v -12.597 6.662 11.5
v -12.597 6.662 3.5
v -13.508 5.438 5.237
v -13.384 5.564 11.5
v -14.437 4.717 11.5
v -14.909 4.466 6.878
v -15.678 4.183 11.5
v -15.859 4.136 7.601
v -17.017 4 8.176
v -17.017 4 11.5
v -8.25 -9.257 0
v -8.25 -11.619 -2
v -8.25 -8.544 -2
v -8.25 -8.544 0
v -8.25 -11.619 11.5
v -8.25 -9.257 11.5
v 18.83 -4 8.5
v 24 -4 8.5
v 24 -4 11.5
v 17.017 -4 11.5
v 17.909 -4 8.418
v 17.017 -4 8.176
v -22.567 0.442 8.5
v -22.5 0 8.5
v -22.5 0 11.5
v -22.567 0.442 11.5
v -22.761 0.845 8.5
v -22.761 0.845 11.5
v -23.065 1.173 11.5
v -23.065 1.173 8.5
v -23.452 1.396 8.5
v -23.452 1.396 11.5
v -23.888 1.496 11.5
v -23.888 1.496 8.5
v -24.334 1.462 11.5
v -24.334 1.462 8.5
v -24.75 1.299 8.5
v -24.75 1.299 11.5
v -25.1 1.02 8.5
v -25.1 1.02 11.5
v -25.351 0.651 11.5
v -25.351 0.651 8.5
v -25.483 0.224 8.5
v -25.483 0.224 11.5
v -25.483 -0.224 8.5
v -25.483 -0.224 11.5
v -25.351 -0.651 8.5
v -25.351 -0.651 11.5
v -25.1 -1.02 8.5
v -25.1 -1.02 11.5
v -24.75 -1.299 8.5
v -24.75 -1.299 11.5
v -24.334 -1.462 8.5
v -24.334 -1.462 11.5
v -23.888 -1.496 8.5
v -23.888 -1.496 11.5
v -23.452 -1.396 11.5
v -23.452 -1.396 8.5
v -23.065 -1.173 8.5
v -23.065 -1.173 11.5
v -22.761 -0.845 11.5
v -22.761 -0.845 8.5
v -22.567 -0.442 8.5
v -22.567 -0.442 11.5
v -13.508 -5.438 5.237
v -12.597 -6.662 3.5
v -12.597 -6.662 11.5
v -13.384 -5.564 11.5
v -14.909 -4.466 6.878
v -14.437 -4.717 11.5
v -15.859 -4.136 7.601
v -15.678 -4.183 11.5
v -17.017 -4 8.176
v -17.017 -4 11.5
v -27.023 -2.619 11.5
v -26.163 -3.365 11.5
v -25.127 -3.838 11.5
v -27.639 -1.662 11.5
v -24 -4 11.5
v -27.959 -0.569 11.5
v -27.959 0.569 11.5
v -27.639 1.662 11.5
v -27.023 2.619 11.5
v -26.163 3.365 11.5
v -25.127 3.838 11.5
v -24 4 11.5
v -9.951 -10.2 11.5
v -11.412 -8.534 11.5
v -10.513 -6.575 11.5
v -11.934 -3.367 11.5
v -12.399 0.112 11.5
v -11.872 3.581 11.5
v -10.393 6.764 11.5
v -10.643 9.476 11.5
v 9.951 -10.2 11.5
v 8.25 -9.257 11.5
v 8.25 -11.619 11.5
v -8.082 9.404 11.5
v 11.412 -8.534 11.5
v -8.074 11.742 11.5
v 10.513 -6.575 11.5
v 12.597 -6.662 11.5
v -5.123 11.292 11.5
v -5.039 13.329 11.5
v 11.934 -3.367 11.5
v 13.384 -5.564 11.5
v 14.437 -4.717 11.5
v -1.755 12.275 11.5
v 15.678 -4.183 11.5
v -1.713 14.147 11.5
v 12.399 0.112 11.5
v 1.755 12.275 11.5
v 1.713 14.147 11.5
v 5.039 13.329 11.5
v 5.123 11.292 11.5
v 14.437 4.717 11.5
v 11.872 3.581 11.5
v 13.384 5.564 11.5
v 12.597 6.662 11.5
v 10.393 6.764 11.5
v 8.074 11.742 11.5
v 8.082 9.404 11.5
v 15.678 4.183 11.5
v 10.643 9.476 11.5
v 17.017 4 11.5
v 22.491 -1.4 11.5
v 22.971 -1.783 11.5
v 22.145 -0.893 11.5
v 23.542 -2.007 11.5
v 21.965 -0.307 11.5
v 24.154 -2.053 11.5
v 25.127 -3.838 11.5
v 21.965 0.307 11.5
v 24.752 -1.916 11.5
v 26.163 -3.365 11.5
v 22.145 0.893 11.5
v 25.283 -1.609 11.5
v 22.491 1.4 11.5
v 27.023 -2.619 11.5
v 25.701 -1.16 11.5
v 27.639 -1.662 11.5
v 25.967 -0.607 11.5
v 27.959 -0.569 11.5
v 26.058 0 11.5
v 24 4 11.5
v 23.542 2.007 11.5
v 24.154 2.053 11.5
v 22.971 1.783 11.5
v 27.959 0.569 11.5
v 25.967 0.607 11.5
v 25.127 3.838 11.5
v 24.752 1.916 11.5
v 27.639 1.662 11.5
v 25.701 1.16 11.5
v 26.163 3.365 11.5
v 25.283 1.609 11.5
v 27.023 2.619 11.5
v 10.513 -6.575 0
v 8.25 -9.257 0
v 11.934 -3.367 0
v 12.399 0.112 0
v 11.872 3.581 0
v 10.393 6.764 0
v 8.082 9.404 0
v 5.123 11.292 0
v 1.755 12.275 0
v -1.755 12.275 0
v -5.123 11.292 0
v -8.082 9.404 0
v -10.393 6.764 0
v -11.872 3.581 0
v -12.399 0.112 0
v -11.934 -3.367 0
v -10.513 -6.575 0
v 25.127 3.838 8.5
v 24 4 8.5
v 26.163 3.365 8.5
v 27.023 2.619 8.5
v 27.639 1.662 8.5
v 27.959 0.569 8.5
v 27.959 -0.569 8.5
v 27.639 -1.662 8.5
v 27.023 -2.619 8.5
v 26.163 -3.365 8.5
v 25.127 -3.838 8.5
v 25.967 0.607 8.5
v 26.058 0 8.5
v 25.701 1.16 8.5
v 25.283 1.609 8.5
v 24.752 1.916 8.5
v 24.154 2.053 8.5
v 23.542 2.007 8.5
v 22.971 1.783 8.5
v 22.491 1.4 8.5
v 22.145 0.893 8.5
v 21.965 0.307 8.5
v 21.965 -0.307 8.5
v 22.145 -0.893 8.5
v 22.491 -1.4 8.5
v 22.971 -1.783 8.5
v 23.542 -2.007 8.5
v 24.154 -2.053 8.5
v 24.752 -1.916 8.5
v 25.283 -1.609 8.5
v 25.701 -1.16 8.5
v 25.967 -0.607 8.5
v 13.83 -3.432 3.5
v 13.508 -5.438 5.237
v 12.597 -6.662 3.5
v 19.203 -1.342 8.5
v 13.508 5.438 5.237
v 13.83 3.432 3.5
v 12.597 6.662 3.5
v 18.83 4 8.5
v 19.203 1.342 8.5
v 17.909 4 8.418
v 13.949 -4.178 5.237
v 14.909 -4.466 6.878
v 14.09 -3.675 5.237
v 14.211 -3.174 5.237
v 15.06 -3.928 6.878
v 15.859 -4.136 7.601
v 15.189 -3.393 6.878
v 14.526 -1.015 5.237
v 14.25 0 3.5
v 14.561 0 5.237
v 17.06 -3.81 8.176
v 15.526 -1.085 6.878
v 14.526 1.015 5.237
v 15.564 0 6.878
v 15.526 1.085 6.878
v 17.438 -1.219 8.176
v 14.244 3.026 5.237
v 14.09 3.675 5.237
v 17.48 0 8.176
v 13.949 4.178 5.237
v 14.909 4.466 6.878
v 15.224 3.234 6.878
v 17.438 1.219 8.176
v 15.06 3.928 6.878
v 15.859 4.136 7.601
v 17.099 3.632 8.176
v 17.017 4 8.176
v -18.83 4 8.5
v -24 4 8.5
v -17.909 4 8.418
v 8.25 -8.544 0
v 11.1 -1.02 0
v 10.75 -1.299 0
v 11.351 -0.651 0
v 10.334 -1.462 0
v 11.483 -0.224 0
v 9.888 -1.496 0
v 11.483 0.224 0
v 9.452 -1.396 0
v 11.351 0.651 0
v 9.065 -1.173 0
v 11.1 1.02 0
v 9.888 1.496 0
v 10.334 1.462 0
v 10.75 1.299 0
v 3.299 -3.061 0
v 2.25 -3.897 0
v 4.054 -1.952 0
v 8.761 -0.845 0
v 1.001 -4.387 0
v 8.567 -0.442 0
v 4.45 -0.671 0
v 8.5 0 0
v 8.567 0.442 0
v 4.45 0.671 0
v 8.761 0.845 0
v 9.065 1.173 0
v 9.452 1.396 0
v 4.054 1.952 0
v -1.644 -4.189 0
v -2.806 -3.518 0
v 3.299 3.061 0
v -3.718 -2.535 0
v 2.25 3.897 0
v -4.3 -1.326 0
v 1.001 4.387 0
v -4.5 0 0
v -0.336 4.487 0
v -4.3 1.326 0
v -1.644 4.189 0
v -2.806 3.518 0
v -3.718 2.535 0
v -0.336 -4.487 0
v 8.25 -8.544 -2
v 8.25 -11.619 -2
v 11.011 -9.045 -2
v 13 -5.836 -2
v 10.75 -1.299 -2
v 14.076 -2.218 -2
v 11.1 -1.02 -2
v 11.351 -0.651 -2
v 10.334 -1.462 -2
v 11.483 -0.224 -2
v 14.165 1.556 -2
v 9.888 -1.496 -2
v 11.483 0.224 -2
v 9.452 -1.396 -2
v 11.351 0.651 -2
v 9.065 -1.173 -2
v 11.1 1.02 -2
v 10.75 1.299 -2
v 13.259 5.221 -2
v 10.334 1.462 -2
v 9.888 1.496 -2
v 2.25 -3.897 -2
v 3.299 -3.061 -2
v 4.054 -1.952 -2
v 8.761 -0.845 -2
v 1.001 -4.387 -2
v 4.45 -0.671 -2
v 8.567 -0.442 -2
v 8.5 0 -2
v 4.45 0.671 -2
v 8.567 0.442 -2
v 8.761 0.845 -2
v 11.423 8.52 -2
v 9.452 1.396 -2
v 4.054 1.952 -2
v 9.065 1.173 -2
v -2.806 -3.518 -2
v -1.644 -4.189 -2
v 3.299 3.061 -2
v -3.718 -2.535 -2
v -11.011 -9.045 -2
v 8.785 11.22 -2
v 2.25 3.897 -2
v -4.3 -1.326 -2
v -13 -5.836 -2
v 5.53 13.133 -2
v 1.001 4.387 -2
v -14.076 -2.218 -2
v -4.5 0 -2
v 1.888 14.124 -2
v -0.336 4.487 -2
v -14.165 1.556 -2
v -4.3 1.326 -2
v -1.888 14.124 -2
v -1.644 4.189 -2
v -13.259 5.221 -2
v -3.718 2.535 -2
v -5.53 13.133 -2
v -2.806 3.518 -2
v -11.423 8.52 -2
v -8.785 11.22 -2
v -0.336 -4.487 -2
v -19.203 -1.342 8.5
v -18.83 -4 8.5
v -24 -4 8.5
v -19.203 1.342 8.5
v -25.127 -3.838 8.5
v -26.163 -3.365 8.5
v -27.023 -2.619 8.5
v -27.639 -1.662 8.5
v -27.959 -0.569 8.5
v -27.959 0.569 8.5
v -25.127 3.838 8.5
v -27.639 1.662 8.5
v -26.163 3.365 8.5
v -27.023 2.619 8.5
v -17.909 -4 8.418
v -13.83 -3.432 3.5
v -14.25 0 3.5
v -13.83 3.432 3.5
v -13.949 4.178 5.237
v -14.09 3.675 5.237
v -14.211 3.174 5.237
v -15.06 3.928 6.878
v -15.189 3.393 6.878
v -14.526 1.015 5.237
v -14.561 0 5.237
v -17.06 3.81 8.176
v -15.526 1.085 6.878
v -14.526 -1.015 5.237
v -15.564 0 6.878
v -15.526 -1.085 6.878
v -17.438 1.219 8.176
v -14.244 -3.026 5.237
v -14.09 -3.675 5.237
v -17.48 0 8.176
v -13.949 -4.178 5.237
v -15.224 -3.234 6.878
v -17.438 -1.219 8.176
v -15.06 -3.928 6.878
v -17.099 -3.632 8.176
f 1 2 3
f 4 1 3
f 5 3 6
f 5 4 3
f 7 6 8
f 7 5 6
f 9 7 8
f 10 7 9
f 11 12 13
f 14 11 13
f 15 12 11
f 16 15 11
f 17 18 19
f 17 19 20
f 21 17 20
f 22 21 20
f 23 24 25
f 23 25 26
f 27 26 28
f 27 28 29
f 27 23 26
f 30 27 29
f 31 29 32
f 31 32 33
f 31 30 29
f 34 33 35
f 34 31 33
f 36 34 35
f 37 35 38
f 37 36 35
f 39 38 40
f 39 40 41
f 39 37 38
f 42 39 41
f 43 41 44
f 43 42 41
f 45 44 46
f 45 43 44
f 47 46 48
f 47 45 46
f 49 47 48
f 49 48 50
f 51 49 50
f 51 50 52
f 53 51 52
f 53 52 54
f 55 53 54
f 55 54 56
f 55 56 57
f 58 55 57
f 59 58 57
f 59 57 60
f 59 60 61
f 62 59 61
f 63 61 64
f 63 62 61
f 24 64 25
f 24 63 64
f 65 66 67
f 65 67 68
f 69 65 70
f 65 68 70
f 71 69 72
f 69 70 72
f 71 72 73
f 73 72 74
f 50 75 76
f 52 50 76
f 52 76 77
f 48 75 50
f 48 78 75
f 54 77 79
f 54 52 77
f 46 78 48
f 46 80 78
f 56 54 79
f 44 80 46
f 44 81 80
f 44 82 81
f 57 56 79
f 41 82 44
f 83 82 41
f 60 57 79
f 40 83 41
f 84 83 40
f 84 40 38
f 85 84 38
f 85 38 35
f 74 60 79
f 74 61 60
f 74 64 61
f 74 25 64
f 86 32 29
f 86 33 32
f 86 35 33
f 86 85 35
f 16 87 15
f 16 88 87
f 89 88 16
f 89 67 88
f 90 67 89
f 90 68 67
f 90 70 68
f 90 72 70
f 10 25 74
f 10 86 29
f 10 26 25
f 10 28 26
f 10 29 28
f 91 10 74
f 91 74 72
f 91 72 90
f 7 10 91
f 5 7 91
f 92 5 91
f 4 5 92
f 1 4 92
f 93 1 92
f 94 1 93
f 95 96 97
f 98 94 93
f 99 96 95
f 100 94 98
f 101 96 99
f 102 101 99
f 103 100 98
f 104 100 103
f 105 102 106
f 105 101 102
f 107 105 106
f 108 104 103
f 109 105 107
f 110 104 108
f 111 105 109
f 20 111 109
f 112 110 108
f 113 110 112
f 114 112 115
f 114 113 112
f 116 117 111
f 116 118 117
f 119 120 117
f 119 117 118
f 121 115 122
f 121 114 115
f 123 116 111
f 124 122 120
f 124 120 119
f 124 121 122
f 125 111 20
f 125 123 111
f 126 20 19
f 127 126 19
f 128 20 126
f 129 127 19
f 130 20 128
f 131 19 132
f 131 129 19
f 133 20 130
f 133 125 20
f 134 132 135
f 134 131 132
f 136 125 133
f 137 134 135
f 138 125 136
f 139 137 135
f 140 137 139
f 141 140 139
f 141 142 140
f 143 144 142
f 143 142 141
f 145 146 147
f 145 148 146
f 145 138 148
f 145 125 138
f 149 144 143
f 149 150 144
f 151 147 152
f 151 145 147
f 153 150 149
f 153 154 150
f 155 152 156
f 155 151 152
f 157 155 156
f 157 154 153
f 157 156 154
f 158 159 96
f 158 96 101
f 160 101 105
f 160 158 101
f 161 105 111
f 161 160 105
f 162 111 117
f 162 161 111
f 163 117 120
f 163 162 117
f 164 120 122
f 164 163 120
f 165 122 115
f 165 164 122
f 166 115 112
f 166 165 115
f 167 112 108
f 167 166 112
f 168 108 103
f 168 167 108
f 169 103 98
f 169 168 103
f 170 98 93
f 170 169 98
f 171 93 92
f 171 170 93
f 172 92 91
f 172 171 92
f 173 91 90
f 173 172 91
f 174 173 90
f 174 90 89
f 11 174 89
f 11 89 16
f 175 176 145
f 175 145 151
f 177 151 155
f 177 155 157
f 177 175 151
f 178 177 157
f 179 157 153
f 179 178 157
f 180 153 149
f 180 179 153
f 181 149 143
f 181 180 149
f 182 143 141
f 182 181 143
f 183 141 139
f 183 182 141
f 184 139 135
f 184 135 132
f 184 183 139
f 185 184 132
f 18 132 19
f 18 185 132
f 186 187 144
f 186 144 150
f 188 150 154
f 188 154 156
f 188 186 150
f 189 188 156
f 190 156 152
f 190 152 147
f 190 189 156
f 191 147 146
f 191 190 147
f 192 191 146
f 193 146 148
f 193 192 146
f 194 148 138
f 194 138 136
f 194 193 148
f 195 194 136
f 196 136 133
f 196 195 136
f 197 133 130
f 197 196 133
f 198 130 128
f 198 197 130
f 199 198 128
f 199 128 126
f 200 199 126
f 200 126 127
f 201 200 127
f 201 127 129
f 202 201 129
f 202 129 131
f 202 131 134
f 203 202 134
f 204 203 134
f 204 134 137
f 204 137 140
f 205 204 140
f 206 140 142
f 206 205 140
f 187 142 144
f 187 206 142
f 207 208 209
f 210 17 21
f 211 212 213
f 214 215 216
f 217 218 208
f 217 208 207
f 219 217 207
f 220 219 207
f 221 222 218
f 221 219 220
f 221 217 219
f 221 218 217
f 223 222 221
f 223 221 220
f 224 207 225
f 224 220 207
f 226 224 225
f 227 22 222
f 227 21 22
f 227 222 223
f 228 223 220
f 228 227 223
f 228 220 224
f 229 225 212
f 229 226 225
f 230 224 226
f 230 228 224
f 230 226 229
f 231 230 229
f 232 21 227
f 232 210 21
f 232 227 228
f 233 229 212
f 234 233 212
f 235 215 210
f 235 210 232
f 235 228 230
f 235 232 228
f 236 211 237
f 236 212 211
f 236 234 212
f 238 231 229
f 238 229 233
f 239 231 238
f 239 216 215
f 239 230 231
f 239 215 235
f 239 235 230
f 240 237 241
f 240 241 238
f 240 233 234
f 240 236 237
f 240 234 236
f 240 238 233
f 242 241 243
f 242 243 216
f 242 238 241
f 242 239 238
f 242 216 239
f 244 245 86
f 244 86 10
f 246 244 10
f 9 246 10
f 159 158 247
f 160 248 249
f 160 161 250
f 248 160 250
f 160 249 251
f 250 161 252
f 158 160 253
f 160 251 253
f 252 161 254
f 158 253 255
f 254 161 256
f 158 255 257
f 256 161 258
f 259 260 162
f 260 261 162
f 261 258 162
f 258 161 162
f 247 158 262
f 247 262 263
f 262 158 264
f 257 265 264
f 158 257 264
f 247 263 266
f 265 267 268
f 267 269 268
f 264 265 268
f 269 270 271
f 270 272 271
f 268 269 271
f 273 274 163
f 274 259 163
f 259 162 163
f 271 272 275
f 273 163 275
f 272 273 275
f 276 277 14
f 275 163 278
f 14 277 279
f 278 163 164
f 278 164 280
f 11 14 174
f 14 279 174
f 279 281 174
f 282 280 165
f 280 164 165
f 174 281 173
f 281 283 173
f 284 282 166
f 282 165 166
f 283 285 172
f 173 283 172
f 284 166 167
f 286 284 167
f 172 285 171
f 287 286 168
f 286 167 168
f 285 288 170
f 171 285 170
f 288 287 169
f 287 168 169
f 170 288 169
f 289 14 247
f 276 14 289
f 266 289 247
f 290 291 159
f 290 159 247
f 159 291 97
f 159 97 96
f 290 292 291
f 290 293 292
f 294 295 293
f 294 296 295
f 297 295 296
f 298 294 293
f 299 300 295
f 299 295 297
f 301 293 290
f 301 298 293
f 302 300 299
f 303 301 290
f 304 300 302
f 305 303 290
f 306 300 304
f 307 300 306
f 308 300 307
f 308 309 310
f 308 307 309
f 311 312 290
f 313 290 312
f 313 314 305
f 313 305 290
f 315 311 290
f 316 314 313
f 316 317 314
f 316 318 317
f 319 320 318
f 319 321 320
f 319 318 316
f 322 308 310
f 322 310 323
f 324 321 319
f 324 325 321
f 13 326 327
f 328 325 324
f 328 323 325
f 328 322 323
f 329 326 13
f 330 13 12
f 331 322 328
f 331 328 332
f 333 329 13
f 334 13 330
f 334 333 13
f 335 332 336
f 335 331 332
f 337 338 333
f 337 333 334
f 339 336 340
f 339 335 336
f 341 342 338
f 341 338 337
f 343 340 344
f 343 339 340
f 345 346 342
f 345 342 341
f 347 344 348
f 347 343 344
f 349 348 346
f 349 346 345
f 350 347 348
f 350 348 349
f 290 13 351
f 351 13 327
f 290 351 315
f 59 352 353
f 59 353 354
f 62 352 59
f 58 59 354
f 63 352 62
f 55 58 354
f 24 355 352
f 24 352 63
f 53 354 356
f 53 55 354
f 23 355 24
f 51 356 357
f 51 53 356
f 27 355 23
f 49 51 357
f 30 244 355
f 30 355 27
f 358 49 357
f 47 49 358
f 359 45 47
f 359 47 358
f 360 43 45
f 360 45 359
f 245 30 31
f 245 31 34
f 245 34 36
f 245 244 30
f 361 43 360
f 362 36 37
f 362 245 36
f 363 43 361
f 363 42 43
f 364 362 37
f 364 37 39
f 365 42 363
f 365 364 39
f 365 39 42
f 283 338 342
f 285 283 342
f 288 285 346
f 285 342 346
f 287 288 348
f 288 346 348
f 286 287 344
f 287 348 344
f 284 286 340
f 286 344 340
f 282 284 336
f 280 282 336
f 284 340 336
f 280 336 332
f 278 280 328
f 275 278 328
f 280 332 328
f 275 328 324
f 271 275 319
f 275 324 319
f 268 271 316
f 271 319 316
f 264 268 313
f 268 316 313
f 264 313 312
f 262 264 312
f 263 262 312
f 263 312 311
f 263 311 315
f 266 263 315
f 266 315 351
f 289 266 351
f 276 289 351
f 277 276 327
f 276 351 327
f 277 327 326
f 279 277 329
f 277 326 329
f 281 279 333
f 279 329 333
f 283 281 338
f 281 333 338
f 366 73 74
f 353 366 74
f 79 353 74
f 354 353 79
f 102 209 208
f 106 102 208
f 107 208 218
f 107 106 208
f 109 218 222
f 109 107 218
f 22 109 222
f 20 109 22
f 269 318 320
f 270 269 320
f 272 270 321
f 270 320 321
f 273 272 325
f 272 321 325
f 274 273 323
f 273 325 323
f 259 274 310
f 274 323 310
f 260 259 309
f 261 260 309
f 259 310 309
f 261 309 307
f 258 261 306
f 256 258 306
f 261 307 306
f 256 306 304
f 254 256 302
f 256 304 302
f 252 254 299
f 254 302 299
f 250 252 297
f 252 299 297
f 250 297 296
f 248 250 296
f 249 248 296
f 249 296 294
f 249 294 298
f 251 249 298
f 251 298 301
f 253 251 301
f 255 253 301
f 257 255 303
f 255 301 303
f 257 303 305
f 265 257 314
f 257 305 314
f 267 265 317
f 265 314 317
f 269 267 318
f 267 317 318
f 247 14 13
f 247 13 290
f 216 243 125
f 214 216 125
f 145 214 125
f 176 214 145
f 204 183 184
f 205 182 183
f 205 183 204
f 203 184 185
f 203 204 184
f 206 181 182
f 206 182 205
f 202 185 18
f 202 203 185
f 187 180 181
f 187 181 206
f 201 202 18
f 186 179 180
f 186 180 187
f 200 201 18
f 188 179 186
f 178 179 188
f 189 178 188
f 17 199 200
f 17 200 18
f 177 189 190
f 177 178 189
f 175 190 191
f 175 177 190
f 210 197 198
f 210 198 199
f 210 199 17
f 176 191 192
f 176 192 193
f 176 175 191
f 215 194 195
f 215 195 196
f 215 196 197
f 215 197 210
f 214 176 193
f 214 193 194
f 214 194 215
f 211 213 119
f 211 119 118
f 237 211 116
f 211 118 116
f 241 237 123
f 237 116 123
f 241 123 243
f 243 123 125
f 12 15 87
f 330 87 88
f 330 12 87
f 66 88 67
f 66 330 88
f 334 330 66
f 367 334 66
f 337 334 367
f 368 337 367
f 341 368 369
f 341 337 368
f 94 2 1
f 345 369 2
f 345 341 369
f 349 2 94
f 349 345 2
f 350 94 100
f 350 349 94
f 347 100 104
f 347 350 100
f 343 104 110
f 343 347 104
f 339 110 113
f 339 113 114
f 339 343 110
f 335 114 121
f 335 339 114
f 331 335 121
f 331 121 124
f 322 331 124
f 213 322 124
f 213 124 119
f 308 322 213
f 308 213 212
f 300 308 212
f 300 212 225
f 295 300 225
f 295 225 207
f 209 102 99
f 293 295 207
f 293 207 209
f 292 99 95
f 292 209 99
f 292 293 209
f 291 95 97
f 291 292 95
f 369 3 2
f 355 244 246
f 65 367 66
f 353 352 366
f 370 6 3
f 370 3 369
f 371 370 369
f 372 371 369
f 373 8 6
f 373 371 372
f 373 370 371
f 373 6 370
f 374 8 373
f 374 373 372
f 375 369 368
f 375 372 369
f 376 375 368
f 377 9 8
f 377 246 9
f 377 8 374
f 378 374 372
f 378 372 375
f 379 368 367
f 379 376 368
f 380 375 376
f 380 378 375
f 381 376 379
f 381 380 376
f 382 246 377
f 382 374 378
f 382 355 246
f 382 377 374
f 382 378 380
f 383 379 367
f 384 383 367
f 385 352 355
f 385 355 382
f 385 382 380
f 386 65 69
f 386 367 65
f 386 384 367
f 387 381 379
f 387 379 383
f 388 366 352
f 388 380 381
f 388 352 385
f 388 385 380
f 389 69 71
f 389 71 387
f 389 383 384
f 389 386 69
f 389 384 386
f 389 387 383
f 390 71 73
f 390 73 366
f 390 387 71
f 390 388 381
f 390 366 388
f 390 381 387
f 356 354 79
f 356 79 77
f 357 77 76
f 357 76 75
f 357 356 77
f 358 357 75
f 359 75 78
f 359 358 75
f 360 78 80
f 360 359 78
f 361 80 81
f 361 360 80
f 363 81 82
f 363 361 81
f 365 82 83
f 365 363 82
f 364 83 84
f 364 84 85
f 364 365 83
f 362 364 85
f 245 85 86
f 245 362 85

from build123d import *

# Parameters (mm, degrees)
SKETCH_1_R          = 14.25
SKETCH_1_R_2        = 12.4
EXTRUDE_1_DEPTH     = 11.5
EXTRUDE_START       = 2
SKETCH_2_R          = 14.25
SKETCH_2_R_2        = 4.5
SKETCH_2_R_3        = 1.5
EXTRUDE_2_DEPTH     = 2
SKETCH_4_W          = 16.5
SKETCH_4_H          = 7.711801842
CUT_EXTRUDE_2_DEPTH = 19
EXTRUDE_START_2     = -3
SKETCH_5_R          = 1.5
SKETCH_5_R_2        = 2.058377943
EXTRUDE_3_DEPTH     = 3
FILLET_1_R          = 5


with BuildPart() as part:
    # 草图1 → 凸台-拉伸1 (new body)
    with BuildSketch(Plane.XY):
        Circle(SKETCH_1_R)
        Circle(SKETCH_1_R_2, mode=Mode.SUBTRACT)
    extrude(amount=EXTRUDE_1_DEPTH)

    # 草图2 → 凸台-拉伸2 (add)
    with BuildSketch(Plane(origin=(0, 0, 0), x_dir=(-1, 0, 0), z_dir=(0, 0, -1)).offset(EXTRUDE_START)):
        Circle(SKETCH_2_R)
        Circle(SKETCH_2_R_2, mode=Mode.SUBTRACT)
        with Locations((-10, 0)):
            Circle(SKETCH_2_R_3, mode=Mode.SUBTRACT)
    extrude(amount=-EXTRUDE_2_DEPTH)

    # 草图4 → 切除-拉伸2 (cut)
    with BuildSketch(Plane.XY.offset(11.5)):
        with Locations((0, -12.4)):
            Rectangle(SKETCH_4_W, SKETCH_4_H)
    extrude(amount=-CUT_EXTRUDE_2_DEPTH, mode=Mode.SUBTRACT)

    # 草图5 → 凸台-拉伸3 (add)
    # profile 1 of 2: a face of its own
    with BuildSketch(Plane.XY.offset(11.5).offset(EXTRUDE_START_2)):
        with BuildLine():
            Line((-24, 4), (-13.677079367, 4))
            ThreePointArc((-13.677079367, 4), (-14.25, 0), (-13.677079367, -4))
            Line((-13.677079367, -4), (-24, -4))
            ThreePointArc((-24, -4), (-28, 0), (-24, 4))
        make_face()
        with Locations((-24, 0)):
            Circle(SKETCH_5_R, mode=Mode.SUBTRACT)
    # profile 2 of 2: a face of its own
    with BuildSketch(Plane.XY.offset(11.5).offset(EXTRUDE_START_2)):
        with BuildLine():
            Line((13.677079367, 4), (24, 4))
            ThreePointArc((24, 4), (28, 0), (24, -4))
            Line((24, -4), (13.677079367, -4))
            ThreePointArc((13.677079367, -4), (14.25, 0), (13.677079367, 4))
        make_face()
        with Locations((24, 0)):
            Circle(SKETCH_5_R_2, mode=Mode.SUBTRACT)
    extrude(amount=EXTRUDE_3_DEPTH)

    # 圆角1
    fillet_1_edges = [part.edges().sort_by_distance(p)[0] for p in [
        (-13.677079367, 4, 10),
        (-13.677079367, -4, 10),
        (-14.25, 0, 8.5),
        (13.677079367, -4, 10),
        (13.677079367, 4, 10),
        (14.25, 0, 8.5),
    ]]
    fillet(fillet_1_edges, radius=FILLET_1_R)


solid = part.part
